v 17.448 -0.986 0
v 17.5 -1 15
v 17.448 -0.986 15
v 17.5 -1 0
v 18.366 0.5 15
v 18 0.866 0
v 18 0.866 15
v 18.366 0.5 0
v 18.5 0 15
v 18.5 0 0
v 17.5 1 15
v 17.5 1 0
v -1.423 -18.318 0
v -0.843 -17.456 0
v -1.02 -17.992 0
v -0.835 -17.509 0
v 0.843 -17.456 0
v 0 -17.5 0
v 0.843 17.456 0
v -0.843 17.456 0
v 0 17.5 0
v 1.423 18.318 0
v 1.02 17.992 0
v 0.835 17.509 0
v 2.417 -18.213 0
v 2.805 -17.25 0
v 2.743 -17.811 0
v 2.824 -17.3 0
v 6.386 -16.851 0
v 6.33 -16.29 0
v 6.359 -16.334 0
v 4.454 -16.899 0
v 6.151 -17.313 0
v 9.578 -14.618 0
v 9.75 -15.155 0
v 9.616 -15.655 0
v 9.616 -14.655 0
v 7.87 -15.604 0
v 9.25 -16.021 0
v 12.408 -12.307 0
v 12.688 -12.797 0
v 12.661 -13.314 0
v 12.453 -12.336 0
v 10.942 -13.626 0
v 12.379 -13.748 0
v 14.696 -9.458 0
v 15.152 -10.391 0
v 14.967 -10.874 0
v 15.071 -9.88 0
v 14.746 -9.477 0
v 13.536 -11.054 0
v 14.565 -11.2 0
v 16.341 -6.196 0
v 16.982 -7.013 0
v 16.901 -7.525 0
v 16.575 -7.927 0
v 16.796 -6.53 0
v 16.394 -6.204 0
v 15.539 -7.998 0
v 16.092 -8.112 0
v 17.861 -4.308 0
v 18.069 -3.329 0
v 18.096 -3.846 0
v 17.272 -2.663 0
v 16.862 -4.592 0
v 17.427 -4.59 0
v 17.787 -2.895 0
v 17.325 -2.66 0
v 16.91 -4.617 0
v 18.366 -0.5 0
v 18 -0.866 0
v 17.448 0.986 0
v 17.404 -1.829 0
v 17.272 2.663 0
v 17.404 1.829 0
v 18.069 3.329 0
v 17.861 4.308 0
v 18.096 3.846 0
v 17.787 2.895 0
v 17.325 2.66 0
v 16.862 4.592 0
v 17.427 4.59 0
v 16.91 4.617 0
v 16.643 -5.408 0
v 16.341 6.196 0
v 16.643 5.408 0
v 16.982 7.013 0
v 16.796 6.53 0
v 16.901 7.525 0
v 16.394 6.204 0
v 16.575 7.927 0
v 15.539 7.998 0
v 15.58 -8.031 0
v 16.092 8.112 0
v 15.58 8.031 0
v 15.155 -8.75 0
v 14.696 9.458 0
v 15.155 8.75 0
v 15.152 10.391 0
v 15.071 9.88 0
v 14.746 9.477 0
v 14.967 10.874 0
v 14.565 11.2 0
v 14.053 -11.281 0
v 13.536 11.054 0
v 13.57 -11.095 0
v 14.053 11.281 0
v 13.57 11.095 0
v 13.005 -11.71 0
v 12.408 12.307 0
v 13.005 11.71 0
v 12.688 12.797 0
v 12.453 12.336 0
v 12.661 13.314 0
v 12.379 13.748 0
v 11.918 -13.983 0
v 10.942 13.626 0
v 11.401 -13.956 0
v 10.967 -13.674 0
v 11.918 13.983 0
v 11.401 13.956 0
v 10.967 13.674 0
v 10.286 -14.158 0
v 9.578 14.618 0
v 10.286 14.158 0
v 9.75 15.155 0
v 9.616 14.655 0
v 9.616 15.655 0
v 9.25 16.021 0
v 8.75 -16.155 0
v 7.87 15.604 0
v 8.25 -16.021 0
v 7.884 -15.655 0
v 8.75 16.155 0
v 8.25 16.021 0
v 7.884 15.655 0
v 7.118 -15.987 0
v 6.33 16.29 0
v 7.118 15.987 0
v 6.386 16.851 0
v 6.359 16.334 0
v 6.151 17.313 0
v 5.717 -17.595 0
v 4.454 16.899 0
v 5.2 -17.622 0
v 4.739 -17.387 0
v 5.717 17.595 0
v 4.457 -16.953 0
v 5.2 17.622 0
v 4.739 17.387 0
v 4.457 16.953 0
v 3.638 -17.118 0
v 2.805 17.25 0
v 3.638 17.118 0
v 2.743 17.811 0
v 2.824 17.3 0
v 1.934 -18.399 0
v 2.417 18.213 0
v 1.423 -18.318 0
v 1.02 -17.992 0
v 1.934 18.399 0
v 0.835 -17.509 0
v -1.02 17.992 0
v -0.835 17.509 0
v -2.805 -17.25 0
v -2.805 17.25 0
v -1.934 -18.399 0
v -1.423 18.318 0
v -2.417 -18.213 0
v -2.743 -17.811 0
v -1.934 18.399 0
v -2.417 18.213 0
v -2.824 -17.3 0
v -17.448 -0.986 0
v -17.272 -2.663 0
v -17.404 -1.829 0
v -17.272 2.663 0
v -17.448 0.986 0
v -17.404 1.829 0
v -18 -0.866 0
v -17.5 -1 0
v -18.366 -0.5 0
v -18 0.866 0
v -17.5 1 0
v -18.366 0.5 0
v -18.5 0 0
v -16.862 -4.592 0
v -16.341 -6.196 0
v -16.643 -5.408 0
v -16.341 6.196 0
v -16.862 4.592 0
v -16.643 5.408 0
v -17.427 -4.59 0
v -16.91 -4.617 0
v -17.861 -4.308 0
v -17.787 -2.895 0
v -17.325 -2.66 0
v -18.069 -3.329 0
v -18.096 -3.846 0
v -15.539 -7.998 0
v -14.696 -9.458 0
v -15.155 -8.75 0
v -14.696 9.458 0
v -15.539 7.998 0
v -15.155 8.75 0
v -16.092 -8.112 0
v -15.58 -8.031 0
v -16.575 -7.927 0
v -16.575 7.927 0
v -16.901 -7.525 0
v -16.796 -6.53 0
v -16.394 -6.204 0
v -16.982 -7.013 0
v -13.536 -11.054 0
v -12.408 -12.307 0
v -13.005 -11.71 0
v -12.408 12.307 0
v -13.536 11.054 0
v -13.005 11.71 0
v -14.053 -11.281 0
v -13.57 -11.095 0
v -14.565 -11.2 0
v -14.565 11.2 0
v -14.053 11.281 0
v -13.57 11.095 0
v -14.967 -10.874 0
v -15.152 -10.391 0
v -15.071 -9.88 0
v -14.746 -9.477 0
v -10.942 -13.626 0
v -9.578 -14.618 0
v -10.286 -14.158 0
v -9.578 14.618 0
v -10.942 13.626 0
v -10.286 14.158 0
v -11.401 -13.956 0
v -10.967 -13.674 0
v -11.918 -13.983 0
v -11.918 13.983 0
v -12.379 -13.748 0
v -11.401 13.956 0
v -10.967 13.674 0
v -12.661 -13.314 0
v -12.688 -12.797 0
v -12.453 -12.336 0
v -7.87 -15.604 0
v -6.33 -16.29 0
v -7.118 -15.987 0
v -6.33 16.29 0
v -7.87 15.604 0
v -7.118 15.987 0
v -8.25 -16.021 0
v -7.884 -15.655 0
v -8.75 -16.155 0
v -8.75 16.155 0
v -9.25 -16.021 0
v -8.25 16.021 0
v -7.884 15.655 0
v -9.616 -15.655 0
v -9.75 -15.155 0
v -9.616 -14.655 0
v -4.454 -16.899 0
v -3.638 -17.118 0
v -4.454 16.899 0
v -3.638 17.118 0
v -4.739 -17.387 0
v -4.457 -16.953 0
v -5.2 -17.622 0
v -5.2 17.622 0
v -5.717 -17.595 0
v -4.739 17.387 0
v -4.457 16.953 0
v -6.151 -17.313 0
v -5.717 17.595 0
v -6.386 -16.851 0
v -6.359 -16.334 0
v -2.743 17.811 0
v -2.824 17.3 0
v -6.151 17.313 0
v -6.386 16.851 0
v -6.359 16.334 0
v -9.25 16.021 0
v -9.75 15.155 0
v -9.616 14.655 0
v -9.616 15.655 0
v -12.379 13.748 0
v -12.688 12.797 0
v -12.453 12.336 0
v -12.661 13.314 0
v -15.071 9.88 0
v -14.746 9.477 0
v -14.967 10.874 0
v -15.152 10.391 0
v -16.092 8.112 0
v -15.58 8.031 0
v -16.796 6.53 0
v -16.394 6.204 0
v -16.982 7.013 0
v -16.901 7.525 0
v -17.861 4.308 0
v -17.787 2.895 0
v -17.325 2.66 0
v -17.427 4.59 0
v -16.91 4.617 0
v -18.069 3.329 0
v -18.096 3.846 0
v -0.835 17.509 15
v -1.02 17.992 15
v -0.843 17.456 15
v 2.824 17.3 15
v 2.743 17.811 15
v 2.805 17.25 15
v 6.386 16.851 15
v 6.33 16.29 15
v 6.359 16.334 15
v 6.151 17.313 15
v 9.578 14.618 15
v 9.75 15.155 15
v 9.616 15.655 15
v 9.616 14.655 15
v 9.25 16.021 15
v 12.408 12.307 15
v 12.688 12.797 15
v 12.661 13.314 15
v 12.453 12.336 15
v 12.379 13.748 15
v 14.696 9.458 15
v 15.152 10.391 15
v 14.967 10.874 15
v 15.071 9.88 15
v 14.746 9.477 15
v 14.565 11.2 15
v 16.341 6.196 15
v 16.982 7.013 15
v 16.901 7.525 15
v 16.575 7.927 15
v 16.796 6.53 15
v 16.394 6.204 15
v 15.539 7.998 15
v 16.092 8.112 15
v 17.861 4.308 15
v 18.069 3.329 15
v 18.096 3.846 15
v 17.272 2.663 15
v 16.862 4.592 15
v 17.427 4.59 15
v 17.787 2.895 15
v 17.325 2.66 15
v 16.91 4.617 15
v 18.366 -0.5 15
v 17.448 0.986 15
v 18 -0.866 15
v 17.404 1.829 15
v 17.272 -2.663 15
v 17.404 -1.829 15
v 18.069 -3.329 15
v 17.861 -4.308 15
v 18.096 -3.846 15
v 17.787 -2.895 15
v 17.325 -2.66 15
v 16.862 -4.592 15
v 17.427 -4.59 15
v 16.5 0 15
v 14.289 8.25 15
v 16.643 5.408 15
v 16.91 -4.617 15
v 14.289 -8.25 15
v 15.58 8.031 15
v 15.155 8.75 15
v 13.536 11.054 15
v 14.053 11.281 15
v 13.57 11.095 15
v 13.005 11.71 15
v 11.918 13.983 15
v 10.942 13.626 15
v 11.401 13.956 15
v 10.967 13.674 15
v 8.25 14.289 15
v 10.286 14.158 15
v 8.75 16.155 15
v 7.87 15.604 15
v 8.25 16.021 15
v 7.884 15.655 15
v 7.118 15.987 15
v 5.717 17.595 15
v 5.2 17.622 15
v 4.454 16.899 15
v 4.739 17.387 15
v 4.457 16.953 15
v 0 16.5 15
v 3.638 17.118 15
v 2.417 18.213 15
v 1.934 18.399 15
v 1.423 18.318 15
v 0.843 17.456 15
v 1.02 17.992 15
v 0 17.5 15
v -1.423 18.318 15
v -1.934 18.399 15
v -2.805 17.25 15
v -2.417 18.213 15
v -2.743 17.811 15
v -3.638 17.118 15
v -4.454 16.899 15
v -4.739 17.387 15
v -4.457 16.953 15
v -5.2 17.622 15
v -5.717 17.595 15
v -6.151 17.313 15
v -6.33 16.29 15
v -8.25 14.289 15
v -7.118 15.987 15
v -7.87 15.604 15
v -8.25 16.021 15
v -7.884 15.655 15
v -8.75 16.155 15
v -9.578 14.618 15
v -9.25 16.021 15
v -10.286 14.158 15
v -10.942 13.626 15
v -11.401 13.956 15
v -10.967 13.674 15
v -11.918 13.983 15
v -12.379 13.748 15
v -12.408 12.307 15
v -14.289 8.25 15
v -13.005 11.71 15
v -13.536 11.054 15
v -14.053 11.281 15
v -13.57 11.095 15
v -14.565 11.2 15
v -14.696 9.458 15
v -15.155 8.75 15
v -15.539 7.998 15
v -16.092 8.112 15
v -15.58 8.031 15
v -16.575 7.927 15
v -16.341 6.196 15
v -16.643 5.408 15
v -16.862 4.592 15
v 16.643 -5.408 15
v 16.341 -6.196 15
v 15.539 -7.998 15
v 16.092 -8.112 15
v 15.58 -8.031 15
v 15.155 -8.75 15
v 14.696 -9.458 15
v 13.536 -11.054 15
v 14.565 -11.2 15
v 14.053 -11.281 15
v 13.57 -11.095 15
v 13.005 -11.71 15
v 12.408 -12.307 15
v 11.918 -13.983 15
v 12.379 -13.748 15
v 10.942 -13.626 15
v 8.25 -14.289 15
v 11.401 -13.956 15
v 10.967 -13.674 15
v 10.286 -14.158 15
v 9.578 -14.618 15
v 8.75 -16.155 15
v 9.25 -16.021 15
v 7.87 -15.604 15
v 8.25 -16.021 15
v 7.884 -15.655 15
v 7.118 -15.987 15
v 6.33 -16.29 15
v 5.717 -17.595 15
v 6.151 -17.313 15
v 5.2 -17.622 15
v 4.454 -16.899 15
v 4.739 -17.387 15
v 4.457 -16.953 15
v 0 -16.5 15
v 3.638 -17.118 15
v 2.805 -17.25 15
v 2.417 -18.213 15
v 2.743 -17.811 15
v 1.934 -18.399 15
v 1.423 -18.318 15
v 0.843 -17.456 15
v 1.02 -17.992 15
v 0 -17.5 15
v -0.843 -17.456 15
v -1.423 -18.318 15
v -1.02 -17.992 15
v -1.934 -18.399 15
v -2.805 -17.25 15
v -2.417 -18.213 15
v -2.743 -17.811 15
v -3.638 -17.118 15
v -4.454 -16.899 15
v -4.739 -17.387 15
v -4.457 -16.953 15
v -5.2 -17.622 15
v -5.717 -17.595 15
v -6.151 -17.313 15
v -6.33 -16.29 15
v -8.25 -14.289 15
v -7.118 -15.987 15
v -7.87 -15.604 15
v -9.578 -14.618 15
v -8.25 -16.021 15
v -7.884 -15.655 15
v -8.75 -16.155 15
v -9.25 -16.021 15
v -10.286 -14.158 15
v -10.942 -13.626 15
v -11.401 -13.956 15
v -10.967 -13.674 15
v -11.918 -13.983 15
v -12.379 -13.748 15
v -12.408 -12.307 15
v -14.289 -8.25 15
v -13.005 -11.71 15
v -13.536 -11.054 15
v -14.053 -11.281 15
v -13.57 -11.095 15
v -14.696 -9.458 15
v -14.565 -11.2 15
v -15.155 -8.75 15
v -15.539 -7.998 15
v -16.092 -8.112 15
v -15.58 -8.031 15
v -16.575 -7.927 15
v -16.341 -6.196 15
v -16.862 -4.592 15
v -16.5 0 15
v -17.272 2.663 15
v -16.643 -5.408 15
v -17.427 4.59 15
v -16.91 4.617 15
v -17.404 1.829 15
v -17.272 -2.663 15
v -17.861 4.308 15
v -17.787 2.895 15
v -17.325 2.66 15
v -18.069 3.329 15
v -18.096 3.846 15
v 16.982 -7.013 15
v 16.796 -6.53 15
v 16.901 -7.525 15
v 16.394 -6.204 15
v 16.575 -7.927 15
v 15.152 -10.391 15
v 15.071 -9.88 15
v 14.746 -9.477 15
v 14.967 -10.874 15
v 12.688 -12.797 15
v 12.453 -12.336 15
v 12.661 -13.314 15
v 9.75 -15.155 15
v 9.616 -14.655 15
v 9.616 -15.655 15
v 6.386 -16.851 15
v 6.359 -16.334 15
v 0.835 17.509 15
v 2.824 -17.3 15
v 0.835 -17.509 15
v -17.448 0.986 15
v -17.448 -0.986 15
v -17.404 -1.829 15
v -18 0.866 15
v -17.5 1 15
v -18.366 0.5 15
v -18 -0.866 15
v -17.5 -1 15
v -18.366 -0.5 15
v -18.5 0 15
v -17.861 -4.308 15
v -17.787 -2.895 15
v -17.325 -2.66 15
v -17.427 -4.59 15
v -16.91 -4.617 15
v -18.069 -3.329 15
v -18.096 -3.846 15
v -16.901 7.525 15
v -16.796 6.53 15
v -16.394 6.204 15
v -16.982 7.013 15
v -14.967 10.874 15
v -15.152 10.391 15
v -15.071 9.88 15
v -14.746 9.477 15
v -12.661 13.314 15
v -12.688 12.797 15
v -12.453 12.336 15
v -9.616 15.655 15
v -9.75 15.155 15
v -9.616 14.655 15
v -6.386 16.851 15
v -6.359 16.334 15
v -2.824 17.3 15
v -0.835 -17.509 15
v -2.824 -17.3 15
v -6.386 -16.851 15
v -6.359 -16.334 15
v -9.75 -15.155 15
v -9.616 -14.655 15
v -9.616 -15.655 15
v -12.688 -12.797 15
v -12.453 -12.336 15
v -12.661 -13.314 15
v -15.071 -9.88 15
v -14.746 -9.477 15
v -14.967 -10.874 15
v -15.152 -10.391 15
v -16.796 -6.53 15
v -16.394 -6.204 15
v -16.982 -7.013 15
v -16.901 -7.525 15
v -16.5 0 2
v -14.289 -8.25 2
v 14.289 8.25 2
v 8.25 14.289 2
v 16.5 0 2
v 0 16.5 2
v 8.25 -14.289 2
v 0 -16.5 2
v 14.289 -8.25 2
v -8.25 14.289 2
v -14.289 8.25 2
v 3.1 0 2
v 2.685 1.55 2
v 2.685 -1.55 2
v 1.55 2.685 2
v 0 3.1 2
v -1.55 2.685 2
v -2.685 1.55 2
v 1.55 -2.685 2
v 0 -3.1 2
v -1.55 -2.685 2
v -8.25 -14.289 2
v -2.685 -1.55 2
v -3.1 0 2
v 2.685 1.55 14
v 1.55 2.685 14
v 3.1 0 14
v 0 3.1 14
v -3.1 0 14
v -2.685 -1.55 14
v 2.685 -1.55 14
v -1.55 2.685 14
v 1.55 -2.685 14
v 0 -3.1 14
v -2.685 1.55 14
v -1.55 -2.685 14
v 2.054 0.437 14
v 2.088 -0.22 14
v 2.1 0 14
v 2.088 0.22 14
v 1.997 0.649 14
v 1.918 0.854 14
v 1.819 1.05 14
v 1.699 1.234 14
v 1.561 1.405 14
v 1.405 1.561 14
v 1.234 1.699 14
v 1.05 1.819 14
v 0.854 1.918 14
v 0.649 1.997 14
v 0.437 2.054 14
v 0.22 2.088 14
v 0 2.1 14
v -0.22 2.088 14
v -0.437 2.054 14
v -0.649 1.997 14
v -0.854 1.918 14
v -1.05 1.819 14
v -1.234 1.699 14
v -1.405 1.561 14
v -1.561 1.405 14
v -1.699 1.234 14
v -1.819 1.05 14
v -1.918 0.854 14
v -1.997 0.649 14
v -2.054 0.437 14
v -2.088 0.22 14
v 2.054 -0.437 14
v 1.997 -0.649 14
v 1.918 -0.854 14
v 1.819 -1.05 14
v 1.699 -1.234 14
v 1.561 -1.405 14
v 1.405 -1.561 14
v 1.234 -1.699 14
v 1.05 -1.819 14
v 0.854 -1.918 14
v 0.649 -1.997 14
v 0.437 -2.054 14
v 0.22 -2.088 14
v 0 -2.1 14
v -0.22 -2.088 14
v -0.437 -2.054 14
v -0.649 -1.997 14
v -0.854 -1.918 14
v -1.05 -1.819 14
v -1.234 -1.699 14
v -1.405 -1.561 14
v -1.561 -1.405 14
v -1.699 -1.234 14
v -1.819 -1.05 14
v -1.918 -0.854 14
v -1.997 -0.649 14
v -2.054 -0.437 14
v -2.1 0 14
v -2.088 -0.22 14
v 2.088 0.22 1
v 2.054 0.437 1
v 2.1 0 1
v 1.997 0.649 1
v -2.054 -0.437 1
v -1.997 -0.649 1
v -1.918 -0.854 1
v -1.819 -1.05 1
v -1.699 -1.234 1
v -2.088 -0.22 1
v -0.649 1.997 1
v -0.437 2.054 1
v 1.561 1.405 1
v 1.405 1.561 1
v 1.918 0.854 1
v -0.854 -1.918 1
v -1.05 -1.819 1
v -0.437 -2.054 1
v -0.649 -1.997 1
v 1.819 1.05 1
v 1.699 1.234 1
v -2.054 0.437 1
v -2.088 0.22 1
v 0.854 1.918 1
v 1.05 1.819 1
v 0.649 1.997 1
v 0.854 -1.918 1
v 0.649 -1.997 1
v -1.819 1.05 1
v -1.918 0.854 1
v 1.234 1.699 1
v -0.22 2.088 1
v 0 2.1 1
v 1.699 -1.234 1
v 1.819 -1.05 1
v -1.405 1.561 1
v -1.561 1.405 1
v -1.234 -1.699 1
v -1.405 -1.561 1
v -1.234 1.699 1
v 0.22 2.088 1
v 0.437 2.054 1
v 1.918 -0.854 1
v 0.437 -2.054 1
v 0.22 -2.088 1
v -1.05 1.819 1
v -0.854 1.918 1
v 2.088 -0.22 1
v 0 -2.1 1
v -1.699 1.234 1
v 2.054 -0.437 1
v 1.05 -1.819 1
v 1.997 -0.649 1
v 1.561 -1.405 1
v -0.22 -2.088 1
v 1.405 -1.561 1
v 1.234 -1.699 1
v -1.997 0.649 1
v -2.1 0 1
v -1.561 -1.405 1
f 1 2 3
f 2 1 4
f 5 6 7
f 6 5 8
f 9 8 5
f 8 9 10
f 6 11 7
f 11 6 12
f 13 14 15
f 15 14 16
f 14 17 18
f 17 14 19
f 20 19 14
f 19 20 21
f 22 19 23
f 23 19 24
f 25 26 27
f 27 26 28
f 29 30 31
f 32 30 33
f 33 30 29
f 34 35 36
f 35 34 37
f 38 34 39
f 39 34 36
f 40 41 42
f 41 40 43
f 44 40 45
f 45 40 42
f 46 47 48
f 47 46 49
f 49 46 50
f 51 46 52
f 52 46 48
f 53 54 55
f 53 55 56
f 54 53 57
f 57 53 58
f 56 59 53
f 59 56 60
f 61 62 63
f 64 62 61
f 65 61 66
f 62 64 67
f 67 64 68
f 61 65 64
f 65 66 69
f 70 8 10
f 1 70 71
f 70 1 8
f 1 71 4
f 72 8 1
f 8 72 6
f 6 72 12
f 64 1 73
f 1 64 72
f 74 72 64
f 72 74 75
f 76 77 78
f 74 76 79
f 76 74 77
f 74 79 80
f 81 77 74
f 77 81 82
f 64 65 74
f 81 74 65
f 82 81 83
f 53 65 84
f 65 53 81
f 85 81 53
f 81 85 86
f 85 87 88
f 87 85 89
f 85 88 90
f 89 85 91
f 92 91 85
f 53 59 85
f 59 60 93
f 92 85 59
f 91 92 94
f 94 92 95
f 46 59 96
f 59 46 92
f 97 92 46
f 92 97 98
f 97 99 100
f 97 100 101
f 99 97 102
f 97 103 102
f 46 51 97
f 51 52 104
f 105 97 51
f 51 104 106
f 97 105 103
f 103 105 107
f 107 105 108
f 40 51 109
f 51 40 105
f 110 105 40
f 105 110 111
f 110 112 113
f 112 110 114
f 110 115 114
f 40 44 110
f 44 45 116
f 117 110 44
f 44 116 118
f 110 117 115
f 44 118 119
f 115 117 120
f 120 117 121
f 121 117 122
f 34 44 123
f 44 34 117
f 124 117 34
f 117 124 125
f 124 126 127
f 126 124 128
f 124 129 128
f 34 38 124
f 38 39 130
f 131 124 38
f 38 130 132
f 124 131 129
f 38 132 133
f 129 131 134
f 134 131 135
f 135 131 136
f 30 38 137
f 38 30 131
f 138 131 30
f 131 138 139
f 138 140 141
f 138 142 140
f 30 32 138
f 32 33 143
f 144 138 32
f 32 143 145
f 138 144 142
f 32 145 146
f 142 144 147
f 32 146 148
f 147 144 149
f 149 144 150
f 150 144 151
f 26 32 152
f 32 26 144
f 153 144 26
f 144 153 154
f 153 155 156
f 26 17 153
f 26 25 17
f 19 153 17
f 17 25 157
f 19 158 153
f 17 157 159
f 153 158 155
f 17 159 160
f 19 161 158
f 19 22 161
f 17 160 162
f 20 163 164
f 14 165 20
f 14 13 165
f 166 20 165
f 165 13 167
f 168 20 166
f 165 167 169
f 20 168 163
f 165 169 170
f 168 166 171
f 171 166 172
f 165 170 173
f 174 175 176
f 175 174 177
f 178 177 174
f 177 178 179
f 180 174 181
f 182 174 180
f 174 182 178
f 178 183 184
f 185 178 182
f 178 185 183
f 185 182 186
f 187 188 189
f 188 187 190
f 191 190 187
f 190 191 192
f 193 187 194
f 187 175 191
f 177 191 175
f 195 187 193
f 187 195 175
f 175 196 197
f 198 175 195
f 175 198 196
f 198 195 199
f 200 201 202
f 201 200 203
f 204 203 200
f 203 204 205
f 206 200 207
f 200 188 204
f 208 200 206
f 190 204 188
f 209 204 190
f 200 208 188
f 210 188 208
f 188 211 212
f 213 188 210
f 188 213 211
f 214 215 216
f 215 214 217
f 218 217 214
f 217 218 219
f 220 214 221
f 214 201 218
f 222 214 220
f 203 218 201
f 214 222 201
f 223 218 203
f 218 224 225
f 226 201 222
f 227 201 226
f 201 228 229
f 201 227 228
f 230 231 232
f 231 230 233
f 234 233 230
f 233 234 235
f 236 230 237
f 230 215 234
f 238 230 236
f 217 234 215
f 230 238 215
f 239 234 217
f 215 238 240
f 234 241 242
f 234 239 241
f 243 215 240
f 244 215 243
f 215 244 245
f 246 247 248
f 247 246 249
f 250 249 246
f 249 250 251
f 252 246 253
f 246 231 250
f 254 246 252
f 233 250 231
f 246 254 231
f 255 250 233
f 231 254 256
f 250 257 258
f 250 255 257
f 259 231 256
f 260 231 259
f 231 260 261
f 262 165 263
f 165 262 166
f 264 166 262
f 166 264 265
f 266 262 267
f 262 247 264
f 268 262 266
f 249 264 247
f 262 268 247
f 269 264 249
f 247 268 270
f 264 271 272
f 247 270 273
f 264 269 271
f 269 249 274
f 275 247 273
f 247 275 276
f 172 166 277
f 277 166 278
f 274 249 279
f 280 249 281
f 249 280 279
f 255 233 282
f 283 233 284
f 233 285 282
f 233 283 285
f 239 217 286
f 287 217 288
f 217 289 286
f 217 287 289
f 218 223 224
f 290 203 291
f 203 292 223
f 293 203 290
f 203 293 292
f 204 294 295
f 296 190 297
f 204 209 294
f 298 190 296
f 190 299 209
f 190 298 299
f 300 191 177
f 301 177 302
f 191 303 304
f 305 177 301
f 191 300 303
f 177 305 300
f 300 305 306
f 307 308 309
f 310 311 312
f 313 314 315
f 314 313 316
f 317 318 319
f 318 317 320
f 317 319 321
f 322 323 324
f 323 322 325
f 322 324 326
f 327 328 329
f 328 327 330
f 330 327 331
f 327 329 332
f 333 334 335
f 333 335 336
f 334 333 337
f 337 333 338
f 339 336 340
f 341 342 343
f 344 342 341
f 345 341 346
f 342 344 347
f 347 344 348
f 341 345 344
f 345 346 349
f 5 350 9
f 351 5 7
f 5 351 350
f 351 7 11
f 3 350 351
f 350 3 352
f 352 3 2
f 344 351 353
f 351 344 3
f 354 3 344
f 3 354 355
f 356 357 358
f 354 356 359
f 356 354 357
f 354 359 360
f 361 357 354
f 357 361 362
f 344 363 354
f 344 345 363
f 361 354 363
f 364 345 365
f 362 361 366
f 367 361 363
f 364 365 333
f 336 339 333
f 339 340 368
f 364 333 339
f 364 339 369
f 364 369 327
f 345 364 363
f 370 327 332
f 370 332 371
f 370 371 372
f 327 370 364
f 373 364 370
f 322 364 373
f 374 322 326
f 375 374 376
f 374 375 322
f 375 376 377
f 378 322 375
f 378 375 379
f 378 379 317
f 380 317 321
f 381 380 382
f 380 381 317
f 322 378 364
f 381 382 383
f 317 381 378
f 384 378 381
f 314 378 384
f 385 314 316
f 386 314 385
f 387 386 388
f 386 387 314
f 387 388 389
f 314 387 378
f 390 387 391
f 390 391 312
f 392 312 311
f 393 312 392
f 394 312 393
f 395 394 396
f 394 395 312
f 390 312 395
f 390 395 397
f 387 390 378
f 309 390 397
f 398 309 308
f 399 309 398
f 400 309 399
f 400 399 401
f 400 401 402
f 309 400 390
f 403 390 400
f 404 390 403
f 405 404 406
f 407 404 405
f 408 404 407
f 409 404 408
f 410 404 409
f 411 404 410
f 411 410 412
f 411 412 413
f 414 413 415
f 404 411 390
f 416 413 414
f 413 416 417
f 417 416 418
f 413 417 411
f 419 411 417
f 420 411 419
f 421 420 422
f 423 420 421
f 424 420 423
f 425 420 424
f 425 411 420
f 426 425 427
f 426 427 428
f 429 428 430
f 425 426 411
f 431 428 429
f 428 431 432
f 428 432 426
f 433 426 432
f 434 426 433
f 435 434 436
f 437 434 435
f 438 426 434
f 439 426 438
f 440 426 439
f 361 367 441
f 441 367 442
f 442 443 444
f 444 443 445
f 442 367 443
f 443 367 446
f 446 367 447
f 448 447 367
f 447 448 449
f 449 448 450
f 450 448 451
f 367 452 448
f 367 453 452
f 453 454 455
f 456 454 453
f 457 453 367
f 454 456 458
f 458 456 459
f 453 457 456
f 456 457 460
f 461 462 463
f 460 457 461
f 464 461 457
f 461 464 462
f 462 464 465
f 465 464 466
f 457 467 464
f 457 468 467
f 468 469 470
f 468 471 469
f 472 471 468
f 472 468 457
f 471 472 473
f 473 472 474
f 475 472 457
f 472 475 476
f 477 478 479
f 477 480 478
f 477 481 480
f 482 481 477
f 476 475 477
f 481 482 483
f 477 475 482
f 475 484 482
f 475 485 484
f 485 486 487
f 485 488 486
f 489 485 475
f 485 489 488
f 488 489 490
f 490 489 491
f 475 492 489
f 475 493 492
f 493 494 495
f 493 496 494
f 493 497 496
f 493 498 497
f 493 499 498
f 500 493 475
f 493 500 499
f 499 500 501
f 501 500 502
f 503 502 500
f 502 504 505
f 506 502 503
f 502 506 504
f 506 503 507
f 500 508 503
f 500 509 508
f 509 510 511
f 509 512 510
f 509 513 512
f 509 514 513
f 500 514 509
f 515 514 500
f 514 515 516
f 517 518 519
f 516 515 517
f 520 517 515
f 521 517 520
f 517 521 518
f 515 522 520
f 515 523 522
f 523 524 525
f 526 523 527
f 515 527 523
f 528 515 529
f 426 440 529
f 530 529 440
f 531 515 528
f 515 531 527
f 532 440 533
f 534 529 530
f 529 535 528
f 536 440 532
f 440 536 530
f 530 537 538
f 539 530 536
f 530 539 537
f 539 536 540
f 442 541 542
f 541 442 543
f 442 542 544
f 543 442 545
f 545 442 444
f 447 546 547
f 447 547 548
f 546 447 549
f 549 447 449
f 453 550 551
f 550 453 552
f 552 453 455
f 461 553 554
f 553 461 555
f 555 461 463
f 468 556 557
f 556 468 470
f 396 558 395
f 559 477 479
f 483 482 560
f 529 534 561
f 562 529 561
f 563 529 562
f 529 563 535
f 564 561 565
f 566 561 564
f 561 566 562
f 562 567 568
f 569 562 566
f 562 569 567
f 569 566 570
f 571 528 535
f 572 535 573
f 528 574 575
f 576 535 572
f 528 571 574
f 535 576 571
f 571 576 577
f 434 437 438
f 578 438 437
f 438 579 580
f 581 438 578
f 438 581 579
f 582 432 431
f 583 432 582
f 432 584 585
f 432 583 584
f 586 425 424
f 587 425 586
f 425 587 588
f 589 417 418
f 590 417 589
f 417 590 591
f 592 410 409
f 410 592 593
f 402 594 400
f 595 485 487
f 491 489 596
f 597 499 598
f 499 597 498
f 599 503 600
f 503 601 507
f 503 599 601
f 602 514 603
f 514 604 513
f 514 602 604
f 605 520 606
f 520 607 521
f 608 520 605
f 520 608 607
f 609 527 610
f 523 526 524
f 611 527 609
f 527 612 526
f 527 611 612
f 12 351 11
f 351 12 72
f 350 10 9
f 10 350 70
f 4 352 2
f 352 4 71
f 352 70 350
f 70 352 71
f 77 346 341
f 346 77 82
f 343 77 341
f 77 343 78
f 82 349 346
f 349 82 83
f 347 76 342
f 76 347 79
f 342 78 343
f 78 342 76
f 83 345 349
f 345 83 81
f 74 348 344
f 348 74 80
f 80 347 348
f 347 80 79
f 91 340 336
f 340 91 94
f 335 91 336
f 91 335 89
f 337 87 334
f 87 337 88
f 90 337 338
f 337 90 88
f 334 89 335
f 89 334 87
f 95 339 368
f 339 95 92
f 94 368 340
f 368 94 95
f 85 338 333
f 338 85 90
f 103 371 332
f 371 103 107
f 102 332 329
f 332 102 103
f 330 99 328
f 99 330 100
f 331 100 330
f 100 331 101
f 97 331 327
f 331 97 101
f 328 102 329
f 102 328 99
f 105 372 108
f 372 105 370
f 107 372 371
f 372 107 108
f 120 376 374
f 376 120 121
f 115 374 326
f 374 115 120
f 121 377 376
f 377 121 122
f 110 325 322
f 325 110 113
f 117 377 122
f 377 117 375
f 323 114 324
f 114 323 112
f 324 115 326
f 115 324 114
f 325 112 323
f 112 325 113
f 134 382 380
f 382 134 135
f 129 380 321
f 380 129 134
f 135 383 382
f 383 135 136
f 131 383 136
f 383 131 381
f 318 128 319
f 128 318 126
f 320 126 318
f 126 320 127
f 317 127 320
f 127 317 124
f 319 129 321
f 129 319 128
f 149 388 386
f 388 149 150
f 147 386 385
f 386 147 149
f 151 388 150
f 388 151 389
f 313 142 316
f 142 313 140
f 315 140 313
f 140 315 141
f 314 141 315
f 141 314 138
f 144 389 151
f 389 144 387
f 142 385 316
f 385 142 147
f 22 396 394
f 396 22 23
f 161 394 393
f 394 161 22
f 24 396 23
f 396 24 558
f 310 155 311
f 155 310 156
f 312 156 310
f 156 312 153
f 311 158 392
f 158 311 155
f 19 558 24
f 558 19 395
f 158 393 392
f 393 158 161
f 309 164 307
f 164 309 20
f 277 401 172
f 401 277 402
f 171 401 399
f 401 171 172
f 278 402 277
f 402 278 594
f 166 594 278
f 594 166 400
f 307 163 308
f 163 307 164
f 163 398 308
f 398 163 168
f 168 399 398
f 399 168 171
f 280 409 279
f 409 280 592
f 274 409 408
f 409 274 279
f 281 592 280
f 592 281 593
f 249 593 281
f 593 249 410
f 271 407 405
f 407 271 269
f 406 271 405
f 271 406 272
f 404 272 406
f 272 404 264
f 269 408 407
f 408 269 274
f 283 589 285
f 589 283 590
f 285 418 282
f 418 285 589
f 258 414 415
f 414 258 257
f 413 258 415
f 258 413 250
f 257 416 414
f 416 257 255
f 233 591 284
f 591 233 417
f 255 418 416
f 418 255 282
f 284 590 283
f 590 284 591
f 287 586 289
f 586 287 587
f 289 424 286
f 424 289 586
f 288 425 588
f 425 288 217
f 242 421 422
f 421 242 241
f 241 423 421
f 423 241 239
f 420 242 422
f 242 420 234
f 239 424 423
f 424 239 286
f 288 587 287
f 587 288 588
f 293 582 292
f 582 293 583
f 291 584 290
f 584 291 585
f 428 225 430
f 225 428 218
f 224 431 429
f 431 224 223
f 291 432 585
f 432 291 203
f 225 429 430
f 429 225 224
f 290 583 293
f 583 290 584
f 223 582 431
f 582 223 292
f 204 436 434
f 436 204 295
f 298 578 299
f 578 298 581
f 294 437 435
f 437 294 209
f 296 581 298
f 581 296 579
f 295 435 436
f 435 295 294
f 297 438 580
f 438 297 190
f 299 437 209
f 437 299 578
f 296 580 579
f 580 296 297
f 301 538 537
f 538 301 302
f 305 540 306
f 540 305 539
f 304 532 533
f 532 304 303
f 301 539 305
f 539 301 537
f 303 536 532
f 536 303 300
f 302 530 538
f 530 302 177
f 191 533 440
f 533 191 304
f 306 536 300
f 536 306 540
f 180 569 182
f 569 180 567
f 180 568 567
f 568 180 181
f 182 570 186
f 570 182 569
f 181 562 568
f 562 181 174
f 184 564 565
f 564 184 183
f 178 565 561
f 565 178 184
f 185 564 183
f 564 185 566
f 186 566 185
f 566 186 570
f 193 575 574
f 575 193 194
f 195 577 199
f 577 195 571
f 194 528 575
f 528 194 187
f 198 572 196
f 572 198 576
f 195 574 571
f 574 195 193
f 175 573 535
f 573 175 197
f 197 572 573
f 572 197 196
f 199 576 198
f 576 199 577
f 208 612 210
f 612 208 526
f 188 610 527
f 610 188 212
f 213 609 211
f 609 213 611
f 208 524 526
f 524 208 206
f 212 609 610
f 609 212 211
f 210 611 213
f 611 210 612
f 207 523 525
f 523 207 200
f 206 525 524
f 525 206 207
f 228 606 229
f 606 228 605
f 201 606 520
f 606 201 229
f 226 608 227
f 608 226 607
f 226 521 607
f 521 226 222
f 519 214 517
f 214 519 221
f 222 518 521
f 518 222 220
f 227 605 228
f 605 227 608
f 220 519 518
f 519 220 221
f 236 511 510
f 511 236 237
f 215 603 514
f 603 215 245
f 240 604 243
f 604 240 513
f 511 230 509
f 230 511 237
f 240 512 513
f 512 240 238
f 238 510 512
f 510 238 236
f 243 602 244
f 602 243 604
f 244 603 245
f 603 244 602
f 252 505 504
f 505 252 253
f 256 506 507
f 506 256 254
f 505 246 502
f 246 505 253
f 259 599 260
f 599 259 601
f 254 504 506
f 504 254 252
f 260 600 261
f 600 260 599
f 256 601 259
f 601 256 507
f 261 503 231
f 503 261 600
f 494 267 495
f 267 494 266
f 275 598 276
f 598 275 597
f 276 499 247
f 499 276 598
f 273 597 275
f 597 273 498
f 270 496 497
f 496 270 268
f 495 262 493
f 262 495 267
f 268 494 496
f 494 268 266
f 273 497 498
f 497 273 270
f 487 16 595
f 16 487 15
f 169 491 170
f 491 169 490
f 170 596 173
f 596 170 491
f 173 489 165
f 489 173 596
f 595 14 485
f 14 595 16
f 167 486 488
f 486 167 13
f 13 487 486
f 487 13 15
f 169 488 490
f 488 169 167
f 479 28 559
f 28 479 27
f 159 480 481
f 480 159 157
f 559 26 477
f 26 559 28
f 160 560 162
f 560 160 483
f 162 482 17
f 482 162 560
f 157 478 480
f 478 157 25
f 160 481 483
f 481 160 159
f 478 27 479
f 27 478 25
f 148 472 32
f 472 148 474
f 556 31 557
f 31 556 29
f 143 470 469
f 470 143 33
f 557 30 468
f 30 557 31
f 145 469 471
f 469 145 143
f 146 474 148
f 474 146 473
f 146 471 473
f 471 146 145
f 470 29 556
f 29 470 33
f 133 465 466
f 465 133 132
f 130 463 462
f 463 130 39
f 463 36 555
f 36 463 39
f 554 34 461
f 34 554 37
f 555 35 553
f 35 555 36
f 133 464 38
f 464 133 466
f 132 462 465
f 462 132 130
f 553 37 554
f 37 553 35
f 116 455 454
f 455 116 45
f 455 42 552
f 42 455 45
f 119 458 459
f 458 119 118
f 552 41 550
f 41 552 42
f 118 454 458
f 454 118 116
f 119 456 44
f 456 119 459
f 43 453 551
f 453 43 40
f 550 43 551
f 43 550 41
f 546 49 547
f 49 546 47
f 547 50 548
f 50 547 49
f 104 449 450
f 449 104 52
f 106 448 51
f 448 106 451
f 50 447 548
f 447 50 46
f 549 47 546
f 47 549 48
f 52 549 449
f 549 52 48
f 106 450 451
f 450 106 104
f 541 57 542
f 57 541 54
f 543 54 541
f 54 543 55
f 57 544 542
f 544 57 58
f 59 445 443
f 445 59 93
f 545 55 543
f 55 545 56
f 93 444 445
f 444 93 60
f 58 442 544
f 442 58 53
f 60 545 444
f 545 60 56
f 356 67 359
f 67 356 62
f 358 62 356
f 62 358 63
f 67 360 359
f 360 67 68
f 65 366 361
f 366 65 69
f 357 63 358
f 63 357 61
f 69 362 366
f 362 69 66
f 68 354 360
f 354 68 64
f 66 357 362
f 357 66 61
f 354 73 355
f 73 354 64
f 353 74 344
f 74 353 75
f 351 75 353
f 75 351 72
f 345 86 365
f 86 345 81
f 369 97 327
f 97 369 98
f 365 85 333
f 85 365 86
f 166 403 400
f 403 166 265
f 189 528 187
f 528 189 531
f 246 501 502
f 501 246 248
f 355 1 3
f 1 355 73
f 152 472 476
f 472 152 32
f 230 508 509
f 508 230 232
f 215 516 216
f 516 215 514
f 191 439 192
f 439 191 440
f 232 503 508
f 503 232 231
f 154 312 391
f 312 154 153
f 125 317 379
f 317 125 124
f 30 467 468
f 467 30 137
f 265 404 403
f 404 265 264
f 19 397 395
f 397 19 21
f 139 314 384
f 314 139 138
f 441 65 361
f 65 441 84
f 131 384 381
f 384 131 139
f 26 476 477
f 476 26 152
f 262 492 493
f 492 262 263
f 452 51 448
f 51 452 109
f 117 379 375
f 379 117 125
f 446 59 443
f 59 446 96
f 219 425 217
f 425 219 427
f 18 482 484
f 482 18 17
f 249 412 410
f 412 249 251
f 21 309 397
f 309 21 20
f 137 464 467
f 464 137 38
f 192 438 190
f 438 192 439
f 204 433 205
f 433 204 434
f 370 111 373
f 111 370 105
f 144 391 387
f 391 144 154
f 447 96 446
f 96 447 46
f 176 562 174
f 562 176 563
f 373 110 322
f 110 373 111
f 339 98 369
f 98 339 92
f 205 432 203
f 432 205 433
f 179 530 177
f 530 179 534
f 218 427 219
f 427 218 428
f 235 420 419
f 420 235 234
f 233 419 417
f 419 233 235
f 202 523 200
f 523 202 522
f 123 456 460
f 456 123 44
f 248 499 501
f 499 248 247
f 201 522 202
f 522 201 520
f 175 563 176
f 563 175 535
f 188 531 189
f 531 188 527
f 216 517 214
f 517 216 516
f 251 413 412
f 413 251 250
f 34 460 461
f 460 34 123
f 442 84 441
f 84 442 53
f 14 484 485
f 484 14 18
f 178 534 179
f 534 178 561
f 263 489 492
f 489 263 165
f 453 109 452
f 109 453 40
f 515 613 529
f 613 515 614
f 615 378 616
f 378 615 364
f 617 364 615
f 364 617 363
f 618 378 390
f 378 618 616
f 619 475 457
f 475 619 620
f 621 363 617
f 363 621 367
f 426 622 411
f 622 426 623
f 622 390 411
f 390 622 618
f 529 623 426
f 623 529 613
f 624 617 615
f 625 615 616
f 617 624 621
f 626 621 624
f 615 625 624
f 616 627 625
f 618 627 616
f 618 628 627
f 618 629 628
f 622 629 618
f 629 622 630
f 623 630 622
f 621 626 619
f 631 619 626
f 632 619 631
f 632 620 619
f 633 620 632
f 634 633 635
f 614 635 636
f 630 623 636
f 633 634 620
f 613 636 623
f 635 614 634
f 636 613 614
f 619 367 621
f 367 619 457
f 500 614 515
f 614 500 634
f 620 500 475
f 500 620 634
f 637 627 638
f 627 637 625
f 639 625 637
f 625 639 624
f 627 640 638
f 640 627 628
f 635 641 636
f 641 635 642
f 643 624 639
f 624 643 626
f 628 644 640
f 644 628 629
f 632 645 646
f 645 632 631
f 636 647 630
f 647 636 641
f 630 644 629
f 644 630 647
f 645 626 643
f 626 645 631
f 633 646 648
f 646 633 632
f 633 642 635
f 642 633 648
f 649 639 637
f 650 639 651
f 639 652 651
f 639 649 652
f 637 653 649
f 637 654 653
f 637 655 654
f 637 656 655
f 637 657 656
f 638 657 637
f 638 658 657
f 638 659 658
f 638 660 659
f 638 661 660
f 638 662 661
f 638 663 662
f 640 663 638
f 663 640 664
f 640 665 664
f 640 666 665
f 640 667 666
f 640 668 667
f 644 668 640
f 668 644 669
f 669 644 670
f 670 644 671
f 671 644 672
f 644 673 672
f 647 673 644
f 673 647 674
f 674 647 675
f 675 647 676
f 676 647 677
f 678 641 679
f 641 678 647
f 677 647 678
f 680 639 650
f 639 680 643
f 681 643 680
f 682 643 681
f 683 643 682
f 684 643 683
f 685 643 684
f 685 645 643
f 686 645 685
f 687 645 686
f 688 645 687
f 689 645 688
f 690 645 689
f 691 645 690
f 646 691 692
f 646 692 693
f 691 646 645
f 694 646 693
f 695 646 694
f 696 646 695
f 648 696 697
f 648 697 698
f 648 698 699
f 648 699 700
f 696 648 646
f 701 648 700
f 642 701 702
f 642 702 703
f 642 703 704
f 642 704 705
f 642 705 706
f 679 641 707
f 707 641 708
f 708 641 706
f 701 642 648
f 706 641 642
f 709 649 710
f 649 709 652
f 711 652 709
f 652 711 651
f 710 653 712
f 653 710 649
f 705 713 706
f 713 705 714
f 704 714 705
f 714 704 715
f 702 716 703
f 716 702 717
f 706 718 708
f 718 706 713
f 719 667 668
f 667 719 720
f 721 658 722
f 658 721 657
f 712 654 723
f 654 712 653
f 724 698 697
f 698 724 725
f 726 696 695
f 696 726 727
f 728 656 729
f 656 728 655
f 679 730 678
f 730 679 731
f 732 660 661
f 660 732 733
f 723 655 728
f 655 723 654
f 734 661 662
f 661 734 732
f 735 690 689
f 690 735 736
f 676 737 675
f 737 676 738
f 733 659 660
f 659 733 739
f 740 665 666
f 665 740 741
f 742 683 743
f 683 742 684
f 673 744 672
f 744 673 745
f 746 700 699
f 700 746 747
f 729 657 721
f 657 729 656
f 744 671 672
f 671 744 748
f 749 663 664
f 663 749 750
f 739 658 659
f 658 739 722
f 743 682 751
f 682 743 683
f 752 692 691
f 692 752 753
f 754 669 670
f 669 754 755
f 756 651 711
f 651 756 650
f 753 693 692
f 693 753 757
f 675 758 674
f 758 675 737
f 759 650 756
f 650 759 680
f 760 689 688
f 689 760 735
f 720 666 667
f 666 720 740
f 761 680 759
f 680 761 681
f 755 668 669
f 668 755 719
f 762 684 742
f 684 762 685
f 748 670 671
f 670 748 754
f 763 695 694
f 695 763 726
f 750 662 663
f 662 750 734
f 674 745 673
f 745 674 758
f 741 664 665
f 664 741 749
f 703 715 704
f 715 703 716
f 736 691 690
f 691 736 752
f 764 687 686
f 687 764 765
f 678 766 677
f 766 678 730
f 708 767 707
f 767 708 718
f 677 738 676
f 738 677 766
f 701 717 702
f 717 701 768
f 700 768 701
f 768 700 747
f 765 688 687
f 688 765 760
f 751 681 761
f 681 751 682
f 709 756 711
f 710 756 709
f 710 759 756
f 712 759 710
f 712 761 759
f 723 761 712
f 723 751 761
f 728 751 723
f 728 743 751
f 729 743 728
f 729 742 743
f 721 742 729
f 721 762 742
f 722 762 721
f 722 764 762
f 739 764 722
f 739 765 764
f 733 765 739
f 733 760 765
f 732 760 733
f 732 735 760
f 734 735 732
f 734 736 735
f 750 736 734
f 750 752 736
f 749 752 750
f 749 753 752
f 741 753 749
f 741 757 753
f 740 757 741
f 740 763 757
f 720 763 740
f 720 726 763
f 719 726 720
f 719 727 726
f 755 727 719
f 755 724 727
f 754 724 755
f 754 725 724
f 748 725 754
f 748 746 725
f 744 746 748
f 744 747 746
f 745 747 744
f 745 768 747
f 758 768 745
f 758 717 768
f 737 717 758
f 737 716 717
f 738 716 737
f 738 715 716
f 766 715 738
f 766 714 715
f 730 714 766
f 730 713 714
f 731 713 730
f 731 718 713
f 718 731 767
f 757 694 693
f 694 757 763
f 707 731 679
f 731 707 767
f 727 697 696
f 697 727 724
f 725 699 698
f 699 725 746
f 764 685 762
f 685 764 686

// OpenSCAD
knob_diameter = 35;
knob_height = 15;
knob_thickness = 2;
shaft_dia = 4.2;
shaft_offset = 1;
rib_count = 30;

$fn = 60;

difference() {
    union() {
        cylinder(d = knob_diameter, h = knob_height);
        for (i = [0 : rib_count]) {
            rotate([0, 0, i * (360 / rib_count)])
                translate([knob_diameter / 2, 0, 0])
                cylinder(d = 2, h = knob_height, $fn = 12);
        }
    }

    difference() {
        translate([0, 0, knob_thickness])
        cylinder(d = knob_diameter - knob_thickness, h = knob_height - knob_thickness + 1, $fn = 12);
        translate([0, 0, knob_thickness])
        cylinder(d = shaft_dia + knob_thickness, h = knob_height - knob_thickness - shaft_offset, $fn = 12);
    }

    translate([0, 0, 1])
    cylinder(d = shaft_dia, h = knob_height + 1 - knob_thickness);
}
